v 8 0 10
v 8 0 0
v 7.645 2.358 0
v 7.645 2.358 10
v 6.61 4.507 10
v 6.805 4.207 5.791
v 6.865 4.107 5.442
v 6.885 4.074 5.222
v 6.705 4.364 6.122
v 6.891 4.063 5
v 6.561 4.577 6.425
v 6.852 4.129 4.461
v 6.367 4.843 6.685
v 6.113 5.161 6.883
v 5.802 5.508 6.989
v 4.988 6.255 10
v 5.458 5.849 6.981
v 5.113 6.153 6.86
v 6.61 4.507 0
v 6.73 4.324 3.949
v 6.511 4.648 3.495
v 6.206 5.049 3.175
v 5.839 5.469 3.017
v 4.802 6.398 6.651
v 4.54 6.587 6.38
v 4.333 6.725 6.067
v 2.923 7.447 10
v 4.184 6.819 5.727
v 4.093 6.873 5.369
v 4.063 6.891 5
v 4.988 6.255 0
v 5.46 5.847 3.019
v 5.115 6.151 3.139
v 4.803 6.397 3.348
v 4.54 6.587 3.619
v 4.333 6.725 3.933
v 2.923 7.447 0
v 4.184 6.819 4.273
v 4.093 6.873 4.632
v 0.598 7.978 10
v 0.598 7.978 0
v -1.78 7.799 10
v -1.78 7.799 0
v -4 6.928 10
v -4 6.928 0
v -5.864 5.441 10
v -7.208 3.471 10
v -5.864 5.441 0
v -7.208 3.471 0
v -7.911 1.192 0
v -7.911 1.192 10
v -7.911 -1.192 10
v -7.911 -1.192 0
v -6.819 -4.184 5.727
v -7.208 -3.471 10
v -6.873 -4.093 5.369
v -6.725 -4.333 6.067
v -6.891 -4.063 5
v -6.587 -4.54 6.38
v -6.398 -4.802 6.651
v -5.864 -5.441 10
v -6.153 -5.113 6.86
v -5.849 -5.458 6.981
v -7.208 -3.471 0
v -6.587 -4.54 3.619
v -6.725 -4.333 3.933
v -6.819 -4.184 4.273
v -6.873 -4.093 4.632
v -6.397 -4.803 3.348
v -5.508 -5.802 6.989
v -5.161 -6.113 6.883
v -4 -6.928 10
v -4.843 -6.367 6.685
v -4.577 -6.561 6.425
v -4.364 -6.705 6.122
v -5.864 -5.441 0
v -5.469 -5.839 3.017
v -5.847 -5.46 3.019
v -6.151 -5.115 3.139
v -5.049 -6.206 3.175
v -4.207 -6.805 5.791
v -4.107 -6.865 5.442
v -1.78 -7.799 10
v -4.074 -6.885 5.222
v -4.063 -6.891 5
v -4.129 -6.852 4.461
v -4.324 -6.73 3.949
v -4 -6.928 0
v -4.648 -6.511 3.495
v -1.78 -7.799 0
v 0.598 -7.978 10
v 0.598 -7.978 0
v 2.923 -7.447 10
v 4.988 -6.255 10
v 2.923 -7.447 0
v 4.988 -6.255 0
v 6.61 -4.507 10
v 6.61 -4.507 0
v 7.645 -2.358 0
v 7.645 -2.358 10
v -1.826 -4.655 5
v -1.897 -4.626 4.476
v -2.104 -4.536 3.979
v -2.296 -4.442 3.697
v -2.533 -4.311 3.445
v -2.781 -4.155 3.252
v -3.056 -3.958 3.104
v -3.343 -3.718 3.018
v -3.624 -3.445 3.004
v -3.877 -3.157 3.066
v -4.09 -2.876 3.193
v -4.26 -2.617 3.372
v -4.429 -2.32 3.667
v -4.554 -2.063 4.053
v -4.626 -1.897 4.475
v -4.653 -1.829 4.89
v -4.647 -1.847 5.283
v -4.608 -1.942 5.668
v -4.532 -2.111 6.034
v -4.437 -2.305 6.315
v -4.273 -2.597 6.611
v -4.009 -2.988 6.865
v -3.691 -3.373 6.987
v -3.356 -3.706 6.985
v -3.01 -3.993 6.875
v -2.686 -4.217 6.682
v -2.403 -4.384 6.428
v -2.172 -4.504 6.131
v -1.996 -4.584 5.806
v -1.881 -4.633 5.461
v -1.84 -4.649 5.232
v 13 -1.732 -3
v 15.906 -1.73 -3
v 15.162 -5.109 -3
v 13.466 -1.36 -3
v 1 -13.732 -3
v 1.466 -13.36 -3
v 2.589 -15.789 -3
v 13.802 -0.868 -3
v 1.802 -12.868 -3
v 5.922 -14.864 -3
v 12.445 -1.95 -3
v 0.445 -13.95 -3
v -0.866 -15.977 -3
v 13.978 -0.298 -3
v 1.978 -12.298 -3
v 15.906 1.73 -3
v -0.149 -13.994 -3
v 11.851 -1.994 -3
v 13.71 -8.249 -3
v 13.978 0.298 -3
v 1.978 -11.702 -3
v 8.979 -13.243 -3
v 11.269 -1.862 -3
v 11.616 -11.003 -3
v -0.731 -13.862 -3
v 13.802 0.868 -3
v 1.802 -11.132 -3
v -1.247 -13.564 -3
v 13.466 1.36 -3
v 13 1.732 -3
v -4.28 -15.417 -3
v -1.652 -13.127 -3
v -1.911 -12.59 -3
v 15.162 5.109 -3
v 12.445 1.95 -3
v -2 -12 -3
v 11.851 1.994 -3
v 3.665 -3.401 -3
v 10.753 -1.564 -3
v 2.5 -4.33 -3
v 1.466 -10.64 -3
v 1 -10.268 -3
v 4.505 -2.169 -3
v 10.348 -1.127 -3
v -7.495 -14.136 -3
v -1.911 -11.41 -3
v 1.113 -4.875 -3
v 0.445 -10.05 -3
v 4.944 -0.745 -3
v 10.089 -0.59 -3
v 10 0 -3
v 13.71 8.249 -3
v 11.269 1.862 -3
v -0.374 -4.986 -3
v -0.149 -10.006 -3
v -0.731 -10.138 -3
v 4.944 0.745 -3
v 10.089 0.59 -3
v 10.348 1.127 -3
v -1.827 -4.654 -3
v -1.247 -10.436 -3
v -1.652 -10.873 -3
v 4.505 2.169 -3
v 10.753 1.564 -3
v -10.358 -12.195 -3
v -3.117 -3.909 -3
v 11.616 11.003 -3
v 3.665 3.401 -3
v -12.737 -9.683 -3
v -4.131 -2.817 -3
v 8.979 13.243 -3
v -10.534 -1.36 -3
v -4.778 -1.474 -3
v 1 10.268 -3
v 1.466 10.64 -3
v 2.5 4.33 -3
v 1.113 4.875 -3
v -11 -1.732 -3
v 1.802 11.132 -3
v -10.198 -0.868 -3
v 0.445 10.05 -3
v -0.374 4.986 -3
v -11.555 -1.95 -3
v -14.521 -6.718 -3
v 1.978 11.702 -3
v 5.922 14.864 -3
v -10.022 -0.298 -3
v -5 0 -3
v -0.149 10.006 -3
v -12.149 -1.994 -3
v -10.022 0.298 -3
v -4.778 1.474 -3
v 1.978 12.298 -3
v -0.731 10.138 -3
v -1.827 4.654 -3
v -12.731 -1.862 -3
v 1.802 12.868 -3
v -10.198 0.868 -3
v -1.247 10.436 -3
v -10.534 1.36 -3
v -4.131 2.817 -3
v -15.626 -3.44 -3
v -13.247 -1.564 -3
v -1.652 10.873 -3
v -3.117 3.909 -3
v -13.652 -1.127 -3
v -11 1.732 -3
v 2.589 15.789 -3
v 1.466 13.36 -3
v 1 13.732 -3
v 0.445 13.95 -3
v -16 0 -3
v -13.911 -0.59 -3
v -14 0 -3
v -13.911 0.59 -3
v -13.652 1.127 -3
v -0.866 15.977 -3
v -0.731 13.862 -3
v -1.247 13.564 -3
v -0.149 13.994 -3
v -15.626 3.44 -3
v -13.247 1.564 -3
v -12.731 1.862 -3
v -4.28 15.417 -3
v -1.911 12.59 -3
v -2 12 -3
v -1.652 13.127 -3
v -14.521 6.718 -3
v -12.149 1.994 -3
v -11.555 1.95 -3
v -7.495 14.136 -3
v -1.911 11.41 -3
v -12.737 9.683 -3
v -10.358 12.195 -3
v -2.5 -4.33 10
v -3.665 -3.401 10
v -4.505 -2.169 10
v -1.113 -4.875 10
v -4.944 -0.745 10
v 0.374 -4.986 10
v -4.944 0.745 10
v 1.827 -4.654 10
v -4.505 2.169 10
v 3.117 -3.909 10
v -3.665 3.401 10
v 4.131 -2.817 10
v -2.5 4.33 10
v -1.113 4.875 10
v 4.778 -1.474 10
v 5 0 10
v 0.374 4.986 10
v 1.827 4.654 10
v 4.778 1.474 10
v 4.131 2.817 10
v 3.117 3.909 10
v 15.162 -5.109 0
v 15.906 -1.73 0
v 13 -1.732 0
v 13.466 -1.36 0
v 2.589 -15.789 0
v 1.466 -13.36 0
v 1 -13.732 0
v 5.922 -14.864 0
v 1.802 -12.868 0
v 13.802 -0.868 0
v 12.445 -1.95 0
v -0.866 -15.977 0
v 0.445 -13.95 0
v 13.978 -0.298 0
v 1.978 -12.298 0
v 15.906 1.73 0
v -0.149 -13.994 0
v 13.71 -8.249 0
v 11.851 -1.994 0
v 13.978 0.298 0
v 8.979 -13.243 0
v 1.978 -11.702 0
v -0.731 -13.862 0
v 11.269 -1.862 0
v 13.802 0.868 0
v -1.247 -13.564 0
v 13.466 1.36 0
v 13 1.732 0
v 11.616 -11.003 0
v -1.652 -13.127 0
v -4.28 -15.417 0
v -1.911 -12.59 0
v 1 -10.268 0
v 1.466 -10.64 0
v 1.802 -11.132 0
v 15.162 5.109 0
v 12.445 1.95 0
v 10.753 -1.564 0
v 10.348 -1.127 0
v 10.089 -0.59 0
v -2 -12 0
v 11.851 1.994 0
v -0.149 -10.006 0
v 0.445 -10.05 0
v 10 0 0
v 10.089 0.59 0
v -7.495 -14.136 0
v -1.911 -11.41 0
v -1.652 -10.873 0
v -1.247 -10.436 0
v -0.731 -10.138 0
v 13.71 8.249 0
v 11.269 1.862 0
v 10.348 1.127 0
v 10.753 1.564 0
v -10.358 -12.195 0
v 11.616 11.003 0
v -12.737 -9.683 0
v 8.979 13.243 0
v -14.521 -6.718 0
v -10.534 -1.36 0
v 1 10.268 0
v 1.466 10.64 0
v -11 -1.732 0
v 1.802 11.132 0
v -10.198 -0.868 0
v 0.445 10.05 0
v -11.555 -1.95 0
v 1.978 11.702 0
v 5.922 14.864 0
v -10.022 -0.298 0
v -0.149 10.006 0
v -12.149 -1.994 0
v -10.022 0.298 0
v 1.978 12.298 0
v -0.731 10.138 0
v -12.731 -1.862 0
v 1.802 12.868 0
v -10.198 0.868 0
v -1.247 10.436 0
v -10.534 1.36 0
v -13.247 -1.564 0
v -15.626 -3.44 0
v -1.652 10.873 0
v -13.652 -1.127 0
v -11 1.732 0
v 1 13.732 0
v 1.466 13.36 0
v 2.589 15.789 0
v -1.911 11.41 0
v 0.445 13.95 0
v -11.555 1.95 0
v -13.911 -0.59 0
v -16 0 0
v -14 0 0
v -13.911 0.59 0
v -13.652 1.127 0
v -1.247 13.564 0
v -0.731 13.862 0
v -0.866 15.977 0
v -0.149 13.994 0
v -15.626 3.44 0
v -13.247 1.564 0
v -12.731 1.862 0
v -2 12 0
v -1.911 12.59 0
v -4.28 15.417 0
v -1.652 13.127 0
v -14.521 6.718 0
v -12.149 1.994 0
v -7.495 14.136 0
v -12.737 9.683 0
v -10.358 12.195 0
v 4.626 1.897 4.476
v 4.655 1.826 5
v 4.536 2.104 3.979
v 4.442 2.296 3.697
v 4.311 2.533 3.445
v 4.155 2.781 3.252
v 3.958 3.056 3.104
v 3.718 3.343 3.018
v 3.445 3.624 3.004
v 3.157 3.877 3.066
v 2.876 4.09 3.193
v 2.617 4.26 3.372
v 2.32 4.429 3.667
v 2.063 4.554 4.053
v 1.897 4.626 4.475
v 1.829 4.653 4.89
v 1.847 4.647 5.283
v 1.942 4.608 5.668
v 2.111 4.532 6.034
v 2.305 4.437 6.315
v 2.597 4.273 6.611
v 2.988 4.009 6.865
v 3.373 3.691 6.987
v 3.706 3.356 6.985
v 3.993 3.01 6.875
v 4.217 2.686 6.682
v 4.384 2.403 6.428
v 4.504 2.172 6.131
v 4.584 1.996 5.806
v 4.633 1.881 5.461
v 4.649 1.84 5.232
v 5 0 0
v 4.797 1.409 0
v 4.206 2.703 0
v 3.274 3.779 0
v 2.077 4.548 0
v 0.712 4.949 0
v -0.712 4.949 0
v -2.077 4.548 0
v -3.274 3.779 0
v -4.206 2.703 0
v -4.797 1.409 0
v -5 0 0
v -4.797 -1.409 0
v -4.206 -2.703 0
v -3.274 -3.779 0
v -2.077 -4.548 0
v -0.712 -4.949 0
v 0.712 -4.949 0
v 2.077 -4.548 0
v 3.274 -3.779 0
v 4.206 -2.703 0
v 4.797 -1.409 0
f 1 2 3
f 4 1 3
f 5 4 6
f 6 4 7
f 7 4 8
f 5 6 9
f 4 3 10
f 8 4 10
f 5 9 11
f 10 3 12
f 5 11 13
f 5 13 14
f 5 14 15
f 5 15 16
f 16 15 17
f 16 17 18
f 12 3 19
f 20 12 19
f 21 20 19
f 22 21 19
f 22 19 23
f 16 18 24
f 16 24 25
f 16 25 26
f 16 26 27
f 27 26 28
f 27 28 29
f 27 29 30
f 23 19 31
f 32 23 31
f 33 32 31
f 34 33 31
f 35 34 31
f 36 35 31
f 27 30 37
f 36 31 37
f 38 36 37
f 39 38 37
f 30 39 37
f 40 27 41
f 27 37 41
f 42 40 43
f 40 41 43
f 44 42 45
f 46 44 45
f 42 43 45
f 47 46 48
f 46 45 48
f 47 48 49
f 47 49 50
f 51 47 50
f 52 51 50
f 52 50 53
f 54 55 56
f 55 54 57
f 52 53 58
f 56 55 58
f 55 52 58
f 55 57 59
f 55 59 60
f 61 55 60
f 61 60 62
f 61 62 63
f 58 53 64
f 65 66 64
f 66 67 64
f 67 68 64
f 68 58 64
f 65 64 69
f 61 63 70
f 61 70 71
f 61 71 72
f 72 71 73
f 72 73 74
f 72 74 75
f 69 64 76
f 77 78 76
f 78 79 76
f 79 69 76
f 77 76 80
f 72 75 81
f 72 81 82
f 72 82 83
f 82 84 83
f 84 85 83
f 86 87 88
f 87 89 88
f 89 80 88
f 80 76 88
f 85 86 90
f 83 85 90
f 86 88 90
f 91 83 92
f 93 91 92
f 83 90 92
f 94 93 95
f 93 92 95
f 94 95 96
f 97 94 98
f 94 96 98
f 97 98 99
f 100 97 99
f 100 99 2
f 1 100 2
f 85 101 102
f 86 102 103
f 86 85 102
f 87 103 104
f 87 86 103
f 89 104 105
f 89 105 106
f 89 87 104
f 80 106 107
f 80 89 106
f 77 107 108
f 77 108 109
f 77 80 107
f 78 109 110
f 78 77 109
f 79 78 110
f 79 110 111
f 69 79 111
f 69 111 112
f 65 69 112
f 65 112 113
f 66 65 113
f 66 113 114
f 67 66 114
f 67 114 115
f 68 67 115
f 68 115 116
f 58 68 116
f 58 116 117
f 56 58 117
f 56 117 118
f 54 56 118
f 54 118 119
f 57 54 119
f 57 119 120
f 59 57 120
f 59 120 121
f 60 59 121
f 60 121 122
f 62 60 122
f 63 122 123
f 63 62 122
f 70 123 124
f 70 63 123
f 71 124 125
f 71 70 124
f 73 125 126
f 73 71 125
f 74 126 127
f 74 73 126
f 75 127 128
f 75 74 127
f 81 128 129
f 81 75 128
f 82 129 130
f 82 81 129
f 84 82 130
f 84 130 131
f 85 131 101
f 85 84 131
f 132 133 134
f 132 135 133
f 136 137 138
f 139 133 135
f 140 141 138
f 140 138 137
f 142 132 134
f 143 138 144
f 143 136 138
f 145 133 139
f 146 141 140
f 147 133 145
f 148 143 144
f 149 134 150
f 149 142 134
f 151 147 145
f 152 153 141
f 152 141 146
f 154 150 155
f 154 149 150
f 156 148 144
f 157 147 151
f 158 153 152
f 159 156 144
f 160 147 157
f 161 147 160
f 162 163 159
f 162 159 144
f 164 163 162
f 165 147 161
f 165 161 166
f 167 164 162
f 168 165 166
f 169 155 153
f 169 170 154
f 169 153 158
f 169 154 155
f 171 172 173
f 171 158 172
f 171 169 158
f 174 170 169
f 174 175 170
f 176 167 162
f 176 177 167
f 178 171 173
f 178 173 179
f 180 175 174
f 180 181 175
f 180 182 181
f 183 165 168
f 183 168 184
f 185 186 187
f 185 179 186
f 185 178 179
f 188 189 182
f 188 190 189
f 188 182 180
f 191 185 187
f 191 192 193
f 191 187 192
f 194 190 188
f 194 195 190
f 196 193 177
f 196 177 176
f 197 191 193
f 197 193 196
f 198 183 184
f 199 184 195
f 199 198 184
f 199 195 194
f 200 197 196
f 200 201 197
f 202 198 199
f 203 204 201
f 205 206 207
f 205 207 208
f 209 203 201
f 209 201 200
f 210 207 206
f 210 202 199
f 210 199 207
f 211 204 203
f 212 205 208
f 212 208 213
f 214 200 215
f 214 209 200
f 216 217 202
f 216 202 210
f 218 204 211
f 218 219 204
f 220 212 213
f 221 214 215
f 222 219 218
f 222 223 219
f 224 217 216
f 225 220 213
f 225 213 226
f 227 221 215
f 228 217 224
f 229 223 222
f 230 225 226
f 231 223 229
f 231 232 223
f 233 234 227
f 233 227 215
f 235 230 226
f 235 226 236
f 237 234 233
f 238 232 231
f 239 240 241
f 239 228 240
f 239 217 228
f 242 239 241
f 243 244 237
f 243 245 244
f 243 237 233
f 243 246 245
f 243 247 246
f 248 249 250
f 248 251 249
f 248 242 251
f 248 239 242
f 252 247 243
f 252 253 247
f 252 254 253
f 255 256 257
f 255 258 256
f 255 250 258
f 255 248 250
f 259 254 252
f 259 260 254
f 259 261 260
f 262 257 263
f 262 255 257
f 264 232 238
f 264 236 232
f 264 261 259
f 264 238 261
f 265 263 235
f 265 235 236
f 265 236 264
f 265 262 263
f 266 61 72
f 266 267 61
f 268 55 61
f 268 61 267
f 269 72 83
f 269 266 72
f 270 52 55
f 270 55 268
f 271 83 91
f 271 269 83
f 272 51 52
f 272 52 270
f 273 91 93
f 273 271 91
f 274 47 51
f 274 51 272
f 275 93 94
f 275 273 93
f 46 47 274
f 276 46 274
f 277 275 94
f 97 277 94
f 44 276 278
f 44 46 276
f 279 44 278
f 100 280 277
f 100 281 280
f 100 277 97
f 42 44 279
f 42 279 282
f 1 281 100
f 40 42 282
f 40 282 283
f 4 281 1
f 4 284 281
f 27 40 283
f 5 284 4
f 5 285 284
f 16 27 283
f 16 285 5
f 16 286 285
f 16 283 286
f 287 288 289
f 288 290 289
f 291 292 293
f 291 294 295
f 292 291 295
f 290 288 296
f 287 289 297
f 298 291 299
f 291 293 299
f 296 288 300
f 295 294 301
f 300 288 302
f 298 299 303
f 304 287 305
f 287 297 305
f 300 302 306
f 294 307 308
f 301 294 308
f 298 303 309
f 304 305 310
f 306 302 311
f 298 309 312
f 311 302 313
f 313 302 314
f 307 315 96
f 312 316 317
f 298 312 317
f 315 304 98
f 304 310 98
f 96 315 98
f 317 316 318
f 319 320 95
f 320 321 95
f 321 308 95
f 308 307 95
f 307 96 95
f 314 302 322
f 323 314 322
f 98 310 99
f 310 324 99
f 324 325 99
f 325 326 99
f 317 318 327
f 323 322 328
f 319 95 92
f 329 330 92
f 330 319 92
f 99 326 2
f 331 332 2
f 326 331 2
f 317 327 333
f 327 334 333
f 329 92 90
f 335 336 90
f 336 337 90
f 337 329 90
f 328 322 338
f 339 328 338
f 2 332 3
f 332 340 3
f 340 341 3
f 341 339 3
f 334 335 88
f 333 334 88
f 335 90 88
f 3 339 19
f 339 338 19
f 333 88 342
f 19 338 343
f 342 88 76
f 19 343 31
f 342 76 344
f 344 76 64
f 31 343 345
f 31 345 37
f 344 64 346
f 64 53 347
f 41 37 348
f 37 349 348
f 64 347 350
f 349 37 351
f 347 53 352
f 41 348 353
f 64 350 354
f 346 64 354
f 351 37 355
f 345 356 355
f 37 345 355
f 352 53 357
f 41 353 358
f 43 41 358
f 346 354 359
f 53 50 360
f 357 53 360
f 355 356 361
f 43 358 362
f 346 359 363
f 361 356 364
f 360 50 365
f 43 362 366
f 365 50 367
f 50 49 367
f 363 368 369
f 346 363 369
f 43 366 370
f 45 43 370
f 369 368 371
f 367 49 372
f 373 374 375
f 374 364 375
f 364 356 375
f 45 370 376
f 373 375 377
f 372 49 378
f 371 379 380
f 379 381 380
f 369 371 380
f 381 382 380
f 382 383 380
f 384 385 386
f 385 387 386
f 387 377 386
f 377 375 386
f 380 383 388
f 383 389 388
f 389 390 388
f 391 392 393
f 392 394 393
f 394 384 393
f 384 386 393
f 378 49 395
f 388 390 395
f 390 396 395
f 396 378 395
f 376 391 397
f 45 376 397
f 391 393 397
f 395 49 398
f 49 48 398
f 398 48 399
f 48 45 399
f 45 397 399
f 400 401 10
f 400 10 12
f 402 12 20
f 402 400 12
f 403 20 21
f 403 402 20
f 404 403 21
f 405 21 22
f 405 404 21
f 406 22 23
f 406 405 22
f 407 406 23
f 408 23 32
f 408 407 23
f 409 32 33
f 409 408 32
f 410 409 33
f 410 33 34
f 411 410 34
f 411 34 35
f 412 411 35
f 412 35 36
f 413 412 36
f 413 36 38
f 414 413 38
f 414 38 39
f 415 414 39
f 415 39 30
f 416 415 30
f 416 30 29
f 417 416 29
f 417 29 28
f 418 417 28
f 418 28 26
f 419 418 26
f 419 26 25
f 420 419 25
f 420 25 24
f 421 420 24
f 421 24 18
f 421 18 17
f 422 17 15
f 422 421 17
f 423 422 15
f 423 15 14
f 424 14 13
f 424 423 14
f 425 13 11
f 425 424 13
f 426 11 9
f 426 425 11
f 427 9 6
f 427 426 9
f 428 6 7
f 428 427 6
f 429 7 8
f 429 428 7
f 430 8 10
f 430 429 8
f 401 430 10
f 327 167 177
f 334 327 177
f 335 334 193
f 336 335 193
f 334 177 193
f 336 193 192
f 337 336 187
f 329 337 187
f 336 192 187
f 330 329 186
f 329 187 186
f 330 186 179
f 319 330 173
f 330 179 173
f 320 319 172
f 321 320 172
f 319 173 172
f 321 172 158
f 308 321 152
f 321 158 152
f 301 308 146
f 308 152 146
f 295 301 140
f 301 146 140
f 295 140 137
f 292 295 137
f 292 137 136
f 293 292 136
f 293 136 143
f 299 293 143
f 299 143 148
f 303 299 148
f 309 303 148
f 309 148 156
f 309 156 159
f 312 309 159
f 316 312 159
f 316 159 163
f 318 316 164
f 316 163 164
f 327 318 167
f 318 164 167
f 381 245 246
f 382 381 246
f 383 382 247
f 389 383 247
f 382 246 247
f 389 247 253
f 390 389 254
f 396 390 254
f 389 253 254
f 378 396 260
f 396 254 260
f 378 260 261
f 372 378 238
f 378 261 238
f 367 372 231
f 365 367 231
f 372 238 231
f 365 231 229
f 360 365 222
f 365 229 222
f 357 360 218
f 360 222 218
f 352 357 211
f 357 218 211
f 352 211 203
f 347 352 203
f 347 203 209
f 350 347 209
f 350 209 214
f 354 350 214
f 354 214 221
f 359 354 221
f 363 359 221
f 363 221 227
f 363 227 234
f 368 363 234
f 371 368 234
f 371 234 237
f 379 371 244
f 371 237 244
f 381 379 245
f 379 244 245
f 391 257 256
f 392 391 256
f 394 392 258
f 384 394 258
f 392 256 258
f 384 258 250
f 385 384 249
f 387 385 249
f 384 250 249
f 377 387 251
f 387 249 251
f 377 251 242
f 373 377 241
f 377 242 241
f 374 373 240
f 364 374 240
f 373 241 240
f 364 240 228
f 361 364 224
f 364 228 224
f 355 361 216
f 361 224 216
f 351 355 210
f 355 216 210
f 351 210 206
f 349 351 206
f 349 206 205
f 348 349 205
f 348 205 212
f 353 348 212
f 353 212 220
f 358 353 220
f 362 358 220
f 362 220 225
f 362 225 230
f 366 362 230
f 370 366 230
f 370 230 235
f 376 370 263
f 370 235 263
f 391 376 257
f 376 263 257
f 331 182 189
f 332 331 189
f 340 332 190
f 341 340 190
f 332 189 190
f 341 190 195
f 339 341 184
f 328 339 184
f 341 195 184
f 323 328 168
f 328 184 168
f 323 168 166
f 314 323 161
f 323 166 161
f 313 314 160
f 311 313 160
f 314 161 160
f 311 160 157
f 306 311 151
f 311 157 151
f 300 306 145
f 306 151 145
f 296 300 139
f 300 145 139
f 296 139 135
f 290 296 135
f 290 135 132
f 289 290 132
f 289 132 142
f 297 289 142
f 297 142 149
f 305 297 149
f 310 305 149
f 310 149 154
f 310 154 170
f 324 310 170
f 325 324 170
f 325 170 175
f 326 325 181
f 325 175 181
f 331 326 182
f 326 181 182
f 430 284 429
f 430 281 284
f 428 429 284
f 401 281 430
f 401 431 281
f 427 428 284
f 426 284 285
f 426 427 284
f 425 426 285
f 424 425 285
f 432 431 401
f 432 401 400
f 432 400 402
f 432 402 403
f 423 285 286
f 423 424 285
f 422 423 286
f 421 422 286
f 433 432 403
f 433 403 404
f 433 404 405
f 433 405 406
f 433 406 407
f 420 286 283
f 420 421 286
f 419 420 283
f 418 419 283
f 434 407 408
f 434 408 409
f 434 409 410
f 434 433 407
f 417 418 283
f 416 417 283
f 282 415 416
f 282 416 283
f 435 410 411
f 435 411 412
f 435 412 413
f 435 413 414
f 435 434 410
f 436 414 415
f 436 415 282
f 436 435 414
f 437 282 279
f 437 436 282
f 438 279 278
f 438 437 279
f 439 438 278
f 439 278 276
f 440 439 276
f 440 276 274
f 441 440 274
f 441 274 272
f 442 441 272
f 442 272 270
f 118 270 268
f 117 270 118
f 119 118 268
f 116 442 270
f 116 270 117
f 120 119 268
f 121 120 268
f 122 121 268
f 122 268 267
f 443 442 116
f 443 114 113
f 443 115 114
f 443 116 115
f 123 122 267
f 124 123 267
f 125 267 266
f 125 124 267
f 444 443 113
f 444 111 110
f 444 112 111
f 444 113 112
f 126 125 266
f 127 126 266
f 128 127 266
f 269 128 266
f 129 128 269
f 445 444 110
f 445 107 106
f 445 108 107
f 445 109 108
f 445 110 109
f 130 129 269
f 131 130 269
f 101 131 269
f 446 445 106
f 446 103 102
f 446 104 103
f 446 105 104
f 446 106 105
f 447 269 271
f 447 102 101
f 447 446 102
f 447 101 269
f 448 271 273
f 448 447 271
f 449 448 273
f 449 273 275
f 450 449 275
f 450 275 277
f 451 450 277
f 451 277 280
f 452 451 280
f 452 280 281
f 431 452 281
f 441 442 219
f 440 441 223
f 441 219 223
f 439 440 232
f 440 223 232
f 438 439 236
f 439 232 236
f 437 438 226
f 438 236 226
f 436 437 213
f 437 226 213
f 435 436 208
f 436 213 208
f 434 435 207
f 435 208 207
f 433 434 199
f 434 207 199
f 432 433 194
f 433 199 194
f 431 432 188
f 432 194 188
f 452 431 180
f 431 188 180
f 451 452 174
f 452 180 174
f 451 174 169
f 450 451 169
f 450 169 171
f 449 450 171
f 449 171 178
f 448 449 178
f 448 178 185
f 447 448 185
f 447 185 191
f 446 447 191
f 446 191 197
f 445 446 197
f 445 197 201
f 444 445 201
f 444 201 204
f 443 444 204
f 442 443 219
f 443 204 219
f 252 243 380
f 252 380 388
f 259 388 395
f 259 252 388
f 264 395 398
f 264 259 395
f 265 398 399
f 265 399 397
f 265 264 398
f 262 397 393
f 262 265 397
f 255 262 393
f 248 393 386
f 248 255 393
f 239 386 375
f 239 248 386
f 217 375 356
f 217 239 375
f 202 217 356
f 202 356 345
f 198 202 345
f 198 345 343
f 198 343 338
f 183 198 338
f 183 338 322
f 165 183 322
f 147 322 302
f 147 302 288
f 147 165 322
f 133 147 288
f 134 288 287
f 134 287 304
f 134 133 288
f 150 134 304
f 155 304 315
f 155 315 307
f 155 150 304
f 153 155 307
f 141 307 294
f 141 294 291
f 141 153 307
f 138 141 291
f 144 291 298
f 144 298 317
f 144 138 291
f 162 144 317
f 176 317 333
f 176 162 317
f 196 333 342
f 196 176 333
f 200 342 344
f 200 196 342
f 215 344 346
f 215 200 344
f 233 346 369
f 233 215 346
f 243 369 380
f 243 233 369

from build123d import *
from build123d.topology import SkipClean

# Parameters (mm, degrees)
SKETCH_1_R               = 8
SKETCH_1_R_2             = 5
EXTRUDE_1_DEPTH          = 10
EXTRUDE_START            = 3
SKETCH_2_R               = 16
SKETCH_2_R_2             = 5
SKETCH_2_R_3             = 2
EXTRUDE_2_DEPTH          = 3
CUT_EXTRUDE_1_DEPTH      = 10
CUT_EXTRUDE_1_DEPTH_BACK = 10
SKETCH_3_R               = 2


with BuildPart() as part:
    # 草图1 → 凸台-拉伸1 (new body)
    with BuildSketch(Plane.XY):
        Circle(SKETCH_1_R)
        Circle(SKETCH_1_R_2, mode=Mode.SUBTRACT)
    extrude(amount=EXTRUDE_1_DEPTH)

    # 草图2 → 凸台-拉伸2 (add)
    with SkipClean():  # the faces are left unmerged after this step: merging them gives an invalid solid
        with BuildSketch(Plane(origin=(0, 0, 0), x_dir=(-1, 0, 0), z_dir=(0, 0, -1)).offset(EXTRUDE_START)):
            Circle(SKETCH_2_R)
            Circle(SKETCH_2_R_2, mode=Mode.SUBTRACT)
            with Locations((-12, 0)):
                Circle(SKETCH_2_R_3, mode=Mode.SUBTRACT)
            with Locations((0, 12)):
                Circle(SKETCH_2_R_3, mode=Mode.SUBTRACT)
            with Locations((12, 0)):
                Circle(SKETCH_2_R_3, mode=Mode.SUBTRACT)
            with Locations((0, -12)):
                Circle(SKETCH_2_R_3, mode=Mode.SUBTRACT)
        extrude(amount=-EXTRUDE_2_DEPTH)

    # 草图3 → 切除-拉伸1 (cut, two sides: drawn at the far end of the back side and taken through both)
    with SkipClean():  # the faces are left unmerged after this step: merging them gives an invalid solid
        with BuildSketch(Plane(origin=(0, 0, 0), x_dir=(0, 0, -1), z_dir=(0.7071067811865488, 0.7071067811865464, 0)).offset(-CUT_EXTRUDE_1_DEPTH_BACK)):
            with Locations((-5, 0)):
                Circle(SKETCH_3_R)
        extrude(amount=CUT_EXTRUDE_1_DEPTH + CUT_EXTRUDE_1_DEPTH_BACK, mode=Mode.SUBTRACT)


solid = part.part
